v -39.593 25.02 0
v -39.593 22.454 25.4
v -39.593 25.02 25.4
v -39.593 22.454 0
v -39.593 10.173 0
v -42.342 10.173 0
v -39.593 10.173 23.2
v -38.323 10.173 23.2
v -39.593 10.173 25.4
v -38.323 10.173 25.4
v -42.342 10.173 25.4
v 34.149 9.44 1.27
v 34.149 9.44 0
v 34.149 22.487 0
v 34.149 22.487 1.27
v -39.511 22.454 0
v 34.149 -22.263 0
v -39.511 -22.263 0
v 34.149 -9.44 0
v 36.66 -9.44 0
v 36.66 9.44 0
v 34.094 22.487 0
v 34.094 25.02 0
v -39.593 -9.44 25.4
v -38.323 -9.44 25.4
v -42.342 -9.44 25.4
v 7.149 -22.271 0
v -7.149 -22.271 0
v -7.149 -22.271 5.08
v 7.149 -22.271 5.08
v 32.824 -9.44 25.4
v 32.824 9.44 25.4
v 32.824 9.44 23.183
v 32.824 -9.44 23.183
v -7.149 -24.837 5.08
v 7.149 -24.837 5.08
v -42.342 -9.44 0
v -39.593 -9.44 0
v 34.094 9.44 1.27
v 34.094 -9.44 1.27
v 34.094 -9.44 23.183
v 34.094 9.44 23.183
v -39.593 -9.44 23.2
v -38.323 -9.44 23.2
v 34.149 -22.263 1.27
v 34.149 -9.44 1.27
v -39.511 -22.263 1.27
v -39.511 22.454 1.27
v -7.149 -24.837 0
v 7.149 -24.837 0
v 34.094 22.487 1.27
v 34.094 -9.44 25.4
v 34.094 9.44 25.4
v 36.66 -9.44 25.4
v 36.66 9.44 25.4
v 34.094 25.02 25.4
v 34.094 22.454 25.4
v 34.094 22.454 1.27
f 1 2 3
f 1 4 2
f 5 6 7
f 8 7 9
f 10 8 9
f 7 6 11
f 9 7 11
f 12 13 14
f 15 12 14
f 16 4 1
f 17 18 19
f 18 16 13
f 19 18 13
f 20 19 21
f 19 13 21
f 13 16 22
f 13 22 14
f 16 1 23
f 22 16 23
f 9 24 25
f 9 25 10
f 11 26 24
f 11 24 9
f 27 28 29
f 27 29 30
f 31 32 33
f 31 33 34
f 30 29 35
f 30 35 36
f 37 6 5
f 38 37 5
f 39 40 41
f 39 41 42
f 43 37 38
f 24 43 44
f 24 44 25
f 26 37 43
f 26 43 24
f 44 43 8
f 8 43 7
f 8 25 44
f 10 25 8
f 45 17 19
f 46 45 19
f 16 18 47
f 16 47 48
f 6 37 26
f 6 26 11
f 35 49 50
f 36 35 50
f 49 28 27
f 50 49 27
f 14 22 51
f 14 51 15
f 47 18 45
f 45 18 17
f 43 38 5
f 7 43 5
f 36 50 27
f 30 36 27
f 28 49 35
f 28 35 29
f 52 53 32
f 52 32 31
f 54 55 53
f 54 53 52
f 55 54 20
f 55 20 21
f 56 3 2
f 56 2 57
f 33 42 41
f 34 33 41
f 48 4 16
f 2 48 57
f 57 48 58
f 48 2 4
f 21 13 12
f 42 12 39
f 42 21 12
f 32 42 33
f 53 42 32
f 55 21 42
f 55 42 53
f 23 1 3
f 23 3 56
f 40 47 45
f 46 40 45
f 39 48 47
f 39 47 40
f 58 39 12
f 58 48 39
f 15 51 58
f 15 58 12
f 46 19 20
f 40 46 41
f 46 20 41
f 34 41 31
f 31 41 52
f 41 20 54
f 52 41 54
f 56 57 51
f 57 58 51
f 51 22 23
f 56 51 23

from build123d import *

# Parameters (mm, degrees)
F0_W      = 73.66
F0_H      = 44.75
F3_DEPTH  = 1.27
F1_W      = 73.6861899495
F1_H      = 2.5661867112
F1_W_2    = 2.5661848485
F1_H_2    = 18.879795447
F4_DEPTH  = 25.4
F1_W_3    = 2.7494840324
F1_H_3    = 19.6129903197
F2_W      = 14.2973195761
F2_H      = 2.5661848485
F5_DEPTH  = 5.08
F6_W      = 73.6861899495
F6_H      = 2.2126811832
F7_DEPTH  = 1.27
F8_W      = 18.879795447
F8_H      = 2.2169503659
F9_DEPTH  = 1.27
F10_W     = 19.6129903197
F10_H     = 2.1999276519
F11_DEPTH = 1.27


with BuildPart() as f3:
    # F0 (on Top) → F3 (new body)
    with BuildSketch(Plane.XY):
        with Locations((-2.6811135895, 0.1122842985)):
            Rectangle(F0_W, F0_H)
    extrude(amount=F3_DEPTH)

    # F1 (on face) → F4 (join)
    with BuildSketch(Plane.XY):
        with Locations((-2.7494840324, 23.7372172996)):
            Rectangle(F1_W, F1_H)
        with Locations((35.3767033666, 0)):
            Rectangle(F1_W_2, F1_H_2)
    extrude(amount=F4_DEPTH)

    # F6 (on face) → F7 (join)
    with BuildSketch(Plane.XZ.offset(-22.454123944)):
        with Locations((-2.7494840324, 24.2936594084)):
            Rectangle(F6_W, F6_H)
    extrude(amount=-F7_DEPTH)

    # F8 (on face) → F9 (join)
    with BuildSketch(Plane(origin=(34.0936109424, 0, 0), x_dir=(0, -1, 0), z_dir=(-1, 0, 0))):
        with Locations((0, 24.291524817)):
            Rectangle(F8_W, F8_H)
    extrude(amount=F9_DEPTH)


with BuildPart() as f4:
    # F1 (on face) → F4, piece 2 (new body)
    with BuildSketch(Plane.XY):
        with Locations((-40.9673210233, 0.3665974364)):
            Rectangle(F1_W_3, F1_H_3)
    extrude(amount=F4_DEPTH)

    # F10 (on face) → F11 (join)
    with BuildSketch(Plane.YZ.offset(-39.5925790071)):
        with Locations((0.3665974364, 24.3000361741)):
            Rectangle(F10_W, F10_H)
    extrude(amount=F11_DEPTH)


with BuildPart() as f5:
    # F2 (on face) → F5 (new body)
    with BuildSketch(Plane.XY):
        with Locations((-4.657e-07, -23.5539171845)):
            Rectangle(F2_W, F2_H)
    extrude(amount=F5_DEPTH)


solid = Compound([f3.part, f4.part, f5.part])
